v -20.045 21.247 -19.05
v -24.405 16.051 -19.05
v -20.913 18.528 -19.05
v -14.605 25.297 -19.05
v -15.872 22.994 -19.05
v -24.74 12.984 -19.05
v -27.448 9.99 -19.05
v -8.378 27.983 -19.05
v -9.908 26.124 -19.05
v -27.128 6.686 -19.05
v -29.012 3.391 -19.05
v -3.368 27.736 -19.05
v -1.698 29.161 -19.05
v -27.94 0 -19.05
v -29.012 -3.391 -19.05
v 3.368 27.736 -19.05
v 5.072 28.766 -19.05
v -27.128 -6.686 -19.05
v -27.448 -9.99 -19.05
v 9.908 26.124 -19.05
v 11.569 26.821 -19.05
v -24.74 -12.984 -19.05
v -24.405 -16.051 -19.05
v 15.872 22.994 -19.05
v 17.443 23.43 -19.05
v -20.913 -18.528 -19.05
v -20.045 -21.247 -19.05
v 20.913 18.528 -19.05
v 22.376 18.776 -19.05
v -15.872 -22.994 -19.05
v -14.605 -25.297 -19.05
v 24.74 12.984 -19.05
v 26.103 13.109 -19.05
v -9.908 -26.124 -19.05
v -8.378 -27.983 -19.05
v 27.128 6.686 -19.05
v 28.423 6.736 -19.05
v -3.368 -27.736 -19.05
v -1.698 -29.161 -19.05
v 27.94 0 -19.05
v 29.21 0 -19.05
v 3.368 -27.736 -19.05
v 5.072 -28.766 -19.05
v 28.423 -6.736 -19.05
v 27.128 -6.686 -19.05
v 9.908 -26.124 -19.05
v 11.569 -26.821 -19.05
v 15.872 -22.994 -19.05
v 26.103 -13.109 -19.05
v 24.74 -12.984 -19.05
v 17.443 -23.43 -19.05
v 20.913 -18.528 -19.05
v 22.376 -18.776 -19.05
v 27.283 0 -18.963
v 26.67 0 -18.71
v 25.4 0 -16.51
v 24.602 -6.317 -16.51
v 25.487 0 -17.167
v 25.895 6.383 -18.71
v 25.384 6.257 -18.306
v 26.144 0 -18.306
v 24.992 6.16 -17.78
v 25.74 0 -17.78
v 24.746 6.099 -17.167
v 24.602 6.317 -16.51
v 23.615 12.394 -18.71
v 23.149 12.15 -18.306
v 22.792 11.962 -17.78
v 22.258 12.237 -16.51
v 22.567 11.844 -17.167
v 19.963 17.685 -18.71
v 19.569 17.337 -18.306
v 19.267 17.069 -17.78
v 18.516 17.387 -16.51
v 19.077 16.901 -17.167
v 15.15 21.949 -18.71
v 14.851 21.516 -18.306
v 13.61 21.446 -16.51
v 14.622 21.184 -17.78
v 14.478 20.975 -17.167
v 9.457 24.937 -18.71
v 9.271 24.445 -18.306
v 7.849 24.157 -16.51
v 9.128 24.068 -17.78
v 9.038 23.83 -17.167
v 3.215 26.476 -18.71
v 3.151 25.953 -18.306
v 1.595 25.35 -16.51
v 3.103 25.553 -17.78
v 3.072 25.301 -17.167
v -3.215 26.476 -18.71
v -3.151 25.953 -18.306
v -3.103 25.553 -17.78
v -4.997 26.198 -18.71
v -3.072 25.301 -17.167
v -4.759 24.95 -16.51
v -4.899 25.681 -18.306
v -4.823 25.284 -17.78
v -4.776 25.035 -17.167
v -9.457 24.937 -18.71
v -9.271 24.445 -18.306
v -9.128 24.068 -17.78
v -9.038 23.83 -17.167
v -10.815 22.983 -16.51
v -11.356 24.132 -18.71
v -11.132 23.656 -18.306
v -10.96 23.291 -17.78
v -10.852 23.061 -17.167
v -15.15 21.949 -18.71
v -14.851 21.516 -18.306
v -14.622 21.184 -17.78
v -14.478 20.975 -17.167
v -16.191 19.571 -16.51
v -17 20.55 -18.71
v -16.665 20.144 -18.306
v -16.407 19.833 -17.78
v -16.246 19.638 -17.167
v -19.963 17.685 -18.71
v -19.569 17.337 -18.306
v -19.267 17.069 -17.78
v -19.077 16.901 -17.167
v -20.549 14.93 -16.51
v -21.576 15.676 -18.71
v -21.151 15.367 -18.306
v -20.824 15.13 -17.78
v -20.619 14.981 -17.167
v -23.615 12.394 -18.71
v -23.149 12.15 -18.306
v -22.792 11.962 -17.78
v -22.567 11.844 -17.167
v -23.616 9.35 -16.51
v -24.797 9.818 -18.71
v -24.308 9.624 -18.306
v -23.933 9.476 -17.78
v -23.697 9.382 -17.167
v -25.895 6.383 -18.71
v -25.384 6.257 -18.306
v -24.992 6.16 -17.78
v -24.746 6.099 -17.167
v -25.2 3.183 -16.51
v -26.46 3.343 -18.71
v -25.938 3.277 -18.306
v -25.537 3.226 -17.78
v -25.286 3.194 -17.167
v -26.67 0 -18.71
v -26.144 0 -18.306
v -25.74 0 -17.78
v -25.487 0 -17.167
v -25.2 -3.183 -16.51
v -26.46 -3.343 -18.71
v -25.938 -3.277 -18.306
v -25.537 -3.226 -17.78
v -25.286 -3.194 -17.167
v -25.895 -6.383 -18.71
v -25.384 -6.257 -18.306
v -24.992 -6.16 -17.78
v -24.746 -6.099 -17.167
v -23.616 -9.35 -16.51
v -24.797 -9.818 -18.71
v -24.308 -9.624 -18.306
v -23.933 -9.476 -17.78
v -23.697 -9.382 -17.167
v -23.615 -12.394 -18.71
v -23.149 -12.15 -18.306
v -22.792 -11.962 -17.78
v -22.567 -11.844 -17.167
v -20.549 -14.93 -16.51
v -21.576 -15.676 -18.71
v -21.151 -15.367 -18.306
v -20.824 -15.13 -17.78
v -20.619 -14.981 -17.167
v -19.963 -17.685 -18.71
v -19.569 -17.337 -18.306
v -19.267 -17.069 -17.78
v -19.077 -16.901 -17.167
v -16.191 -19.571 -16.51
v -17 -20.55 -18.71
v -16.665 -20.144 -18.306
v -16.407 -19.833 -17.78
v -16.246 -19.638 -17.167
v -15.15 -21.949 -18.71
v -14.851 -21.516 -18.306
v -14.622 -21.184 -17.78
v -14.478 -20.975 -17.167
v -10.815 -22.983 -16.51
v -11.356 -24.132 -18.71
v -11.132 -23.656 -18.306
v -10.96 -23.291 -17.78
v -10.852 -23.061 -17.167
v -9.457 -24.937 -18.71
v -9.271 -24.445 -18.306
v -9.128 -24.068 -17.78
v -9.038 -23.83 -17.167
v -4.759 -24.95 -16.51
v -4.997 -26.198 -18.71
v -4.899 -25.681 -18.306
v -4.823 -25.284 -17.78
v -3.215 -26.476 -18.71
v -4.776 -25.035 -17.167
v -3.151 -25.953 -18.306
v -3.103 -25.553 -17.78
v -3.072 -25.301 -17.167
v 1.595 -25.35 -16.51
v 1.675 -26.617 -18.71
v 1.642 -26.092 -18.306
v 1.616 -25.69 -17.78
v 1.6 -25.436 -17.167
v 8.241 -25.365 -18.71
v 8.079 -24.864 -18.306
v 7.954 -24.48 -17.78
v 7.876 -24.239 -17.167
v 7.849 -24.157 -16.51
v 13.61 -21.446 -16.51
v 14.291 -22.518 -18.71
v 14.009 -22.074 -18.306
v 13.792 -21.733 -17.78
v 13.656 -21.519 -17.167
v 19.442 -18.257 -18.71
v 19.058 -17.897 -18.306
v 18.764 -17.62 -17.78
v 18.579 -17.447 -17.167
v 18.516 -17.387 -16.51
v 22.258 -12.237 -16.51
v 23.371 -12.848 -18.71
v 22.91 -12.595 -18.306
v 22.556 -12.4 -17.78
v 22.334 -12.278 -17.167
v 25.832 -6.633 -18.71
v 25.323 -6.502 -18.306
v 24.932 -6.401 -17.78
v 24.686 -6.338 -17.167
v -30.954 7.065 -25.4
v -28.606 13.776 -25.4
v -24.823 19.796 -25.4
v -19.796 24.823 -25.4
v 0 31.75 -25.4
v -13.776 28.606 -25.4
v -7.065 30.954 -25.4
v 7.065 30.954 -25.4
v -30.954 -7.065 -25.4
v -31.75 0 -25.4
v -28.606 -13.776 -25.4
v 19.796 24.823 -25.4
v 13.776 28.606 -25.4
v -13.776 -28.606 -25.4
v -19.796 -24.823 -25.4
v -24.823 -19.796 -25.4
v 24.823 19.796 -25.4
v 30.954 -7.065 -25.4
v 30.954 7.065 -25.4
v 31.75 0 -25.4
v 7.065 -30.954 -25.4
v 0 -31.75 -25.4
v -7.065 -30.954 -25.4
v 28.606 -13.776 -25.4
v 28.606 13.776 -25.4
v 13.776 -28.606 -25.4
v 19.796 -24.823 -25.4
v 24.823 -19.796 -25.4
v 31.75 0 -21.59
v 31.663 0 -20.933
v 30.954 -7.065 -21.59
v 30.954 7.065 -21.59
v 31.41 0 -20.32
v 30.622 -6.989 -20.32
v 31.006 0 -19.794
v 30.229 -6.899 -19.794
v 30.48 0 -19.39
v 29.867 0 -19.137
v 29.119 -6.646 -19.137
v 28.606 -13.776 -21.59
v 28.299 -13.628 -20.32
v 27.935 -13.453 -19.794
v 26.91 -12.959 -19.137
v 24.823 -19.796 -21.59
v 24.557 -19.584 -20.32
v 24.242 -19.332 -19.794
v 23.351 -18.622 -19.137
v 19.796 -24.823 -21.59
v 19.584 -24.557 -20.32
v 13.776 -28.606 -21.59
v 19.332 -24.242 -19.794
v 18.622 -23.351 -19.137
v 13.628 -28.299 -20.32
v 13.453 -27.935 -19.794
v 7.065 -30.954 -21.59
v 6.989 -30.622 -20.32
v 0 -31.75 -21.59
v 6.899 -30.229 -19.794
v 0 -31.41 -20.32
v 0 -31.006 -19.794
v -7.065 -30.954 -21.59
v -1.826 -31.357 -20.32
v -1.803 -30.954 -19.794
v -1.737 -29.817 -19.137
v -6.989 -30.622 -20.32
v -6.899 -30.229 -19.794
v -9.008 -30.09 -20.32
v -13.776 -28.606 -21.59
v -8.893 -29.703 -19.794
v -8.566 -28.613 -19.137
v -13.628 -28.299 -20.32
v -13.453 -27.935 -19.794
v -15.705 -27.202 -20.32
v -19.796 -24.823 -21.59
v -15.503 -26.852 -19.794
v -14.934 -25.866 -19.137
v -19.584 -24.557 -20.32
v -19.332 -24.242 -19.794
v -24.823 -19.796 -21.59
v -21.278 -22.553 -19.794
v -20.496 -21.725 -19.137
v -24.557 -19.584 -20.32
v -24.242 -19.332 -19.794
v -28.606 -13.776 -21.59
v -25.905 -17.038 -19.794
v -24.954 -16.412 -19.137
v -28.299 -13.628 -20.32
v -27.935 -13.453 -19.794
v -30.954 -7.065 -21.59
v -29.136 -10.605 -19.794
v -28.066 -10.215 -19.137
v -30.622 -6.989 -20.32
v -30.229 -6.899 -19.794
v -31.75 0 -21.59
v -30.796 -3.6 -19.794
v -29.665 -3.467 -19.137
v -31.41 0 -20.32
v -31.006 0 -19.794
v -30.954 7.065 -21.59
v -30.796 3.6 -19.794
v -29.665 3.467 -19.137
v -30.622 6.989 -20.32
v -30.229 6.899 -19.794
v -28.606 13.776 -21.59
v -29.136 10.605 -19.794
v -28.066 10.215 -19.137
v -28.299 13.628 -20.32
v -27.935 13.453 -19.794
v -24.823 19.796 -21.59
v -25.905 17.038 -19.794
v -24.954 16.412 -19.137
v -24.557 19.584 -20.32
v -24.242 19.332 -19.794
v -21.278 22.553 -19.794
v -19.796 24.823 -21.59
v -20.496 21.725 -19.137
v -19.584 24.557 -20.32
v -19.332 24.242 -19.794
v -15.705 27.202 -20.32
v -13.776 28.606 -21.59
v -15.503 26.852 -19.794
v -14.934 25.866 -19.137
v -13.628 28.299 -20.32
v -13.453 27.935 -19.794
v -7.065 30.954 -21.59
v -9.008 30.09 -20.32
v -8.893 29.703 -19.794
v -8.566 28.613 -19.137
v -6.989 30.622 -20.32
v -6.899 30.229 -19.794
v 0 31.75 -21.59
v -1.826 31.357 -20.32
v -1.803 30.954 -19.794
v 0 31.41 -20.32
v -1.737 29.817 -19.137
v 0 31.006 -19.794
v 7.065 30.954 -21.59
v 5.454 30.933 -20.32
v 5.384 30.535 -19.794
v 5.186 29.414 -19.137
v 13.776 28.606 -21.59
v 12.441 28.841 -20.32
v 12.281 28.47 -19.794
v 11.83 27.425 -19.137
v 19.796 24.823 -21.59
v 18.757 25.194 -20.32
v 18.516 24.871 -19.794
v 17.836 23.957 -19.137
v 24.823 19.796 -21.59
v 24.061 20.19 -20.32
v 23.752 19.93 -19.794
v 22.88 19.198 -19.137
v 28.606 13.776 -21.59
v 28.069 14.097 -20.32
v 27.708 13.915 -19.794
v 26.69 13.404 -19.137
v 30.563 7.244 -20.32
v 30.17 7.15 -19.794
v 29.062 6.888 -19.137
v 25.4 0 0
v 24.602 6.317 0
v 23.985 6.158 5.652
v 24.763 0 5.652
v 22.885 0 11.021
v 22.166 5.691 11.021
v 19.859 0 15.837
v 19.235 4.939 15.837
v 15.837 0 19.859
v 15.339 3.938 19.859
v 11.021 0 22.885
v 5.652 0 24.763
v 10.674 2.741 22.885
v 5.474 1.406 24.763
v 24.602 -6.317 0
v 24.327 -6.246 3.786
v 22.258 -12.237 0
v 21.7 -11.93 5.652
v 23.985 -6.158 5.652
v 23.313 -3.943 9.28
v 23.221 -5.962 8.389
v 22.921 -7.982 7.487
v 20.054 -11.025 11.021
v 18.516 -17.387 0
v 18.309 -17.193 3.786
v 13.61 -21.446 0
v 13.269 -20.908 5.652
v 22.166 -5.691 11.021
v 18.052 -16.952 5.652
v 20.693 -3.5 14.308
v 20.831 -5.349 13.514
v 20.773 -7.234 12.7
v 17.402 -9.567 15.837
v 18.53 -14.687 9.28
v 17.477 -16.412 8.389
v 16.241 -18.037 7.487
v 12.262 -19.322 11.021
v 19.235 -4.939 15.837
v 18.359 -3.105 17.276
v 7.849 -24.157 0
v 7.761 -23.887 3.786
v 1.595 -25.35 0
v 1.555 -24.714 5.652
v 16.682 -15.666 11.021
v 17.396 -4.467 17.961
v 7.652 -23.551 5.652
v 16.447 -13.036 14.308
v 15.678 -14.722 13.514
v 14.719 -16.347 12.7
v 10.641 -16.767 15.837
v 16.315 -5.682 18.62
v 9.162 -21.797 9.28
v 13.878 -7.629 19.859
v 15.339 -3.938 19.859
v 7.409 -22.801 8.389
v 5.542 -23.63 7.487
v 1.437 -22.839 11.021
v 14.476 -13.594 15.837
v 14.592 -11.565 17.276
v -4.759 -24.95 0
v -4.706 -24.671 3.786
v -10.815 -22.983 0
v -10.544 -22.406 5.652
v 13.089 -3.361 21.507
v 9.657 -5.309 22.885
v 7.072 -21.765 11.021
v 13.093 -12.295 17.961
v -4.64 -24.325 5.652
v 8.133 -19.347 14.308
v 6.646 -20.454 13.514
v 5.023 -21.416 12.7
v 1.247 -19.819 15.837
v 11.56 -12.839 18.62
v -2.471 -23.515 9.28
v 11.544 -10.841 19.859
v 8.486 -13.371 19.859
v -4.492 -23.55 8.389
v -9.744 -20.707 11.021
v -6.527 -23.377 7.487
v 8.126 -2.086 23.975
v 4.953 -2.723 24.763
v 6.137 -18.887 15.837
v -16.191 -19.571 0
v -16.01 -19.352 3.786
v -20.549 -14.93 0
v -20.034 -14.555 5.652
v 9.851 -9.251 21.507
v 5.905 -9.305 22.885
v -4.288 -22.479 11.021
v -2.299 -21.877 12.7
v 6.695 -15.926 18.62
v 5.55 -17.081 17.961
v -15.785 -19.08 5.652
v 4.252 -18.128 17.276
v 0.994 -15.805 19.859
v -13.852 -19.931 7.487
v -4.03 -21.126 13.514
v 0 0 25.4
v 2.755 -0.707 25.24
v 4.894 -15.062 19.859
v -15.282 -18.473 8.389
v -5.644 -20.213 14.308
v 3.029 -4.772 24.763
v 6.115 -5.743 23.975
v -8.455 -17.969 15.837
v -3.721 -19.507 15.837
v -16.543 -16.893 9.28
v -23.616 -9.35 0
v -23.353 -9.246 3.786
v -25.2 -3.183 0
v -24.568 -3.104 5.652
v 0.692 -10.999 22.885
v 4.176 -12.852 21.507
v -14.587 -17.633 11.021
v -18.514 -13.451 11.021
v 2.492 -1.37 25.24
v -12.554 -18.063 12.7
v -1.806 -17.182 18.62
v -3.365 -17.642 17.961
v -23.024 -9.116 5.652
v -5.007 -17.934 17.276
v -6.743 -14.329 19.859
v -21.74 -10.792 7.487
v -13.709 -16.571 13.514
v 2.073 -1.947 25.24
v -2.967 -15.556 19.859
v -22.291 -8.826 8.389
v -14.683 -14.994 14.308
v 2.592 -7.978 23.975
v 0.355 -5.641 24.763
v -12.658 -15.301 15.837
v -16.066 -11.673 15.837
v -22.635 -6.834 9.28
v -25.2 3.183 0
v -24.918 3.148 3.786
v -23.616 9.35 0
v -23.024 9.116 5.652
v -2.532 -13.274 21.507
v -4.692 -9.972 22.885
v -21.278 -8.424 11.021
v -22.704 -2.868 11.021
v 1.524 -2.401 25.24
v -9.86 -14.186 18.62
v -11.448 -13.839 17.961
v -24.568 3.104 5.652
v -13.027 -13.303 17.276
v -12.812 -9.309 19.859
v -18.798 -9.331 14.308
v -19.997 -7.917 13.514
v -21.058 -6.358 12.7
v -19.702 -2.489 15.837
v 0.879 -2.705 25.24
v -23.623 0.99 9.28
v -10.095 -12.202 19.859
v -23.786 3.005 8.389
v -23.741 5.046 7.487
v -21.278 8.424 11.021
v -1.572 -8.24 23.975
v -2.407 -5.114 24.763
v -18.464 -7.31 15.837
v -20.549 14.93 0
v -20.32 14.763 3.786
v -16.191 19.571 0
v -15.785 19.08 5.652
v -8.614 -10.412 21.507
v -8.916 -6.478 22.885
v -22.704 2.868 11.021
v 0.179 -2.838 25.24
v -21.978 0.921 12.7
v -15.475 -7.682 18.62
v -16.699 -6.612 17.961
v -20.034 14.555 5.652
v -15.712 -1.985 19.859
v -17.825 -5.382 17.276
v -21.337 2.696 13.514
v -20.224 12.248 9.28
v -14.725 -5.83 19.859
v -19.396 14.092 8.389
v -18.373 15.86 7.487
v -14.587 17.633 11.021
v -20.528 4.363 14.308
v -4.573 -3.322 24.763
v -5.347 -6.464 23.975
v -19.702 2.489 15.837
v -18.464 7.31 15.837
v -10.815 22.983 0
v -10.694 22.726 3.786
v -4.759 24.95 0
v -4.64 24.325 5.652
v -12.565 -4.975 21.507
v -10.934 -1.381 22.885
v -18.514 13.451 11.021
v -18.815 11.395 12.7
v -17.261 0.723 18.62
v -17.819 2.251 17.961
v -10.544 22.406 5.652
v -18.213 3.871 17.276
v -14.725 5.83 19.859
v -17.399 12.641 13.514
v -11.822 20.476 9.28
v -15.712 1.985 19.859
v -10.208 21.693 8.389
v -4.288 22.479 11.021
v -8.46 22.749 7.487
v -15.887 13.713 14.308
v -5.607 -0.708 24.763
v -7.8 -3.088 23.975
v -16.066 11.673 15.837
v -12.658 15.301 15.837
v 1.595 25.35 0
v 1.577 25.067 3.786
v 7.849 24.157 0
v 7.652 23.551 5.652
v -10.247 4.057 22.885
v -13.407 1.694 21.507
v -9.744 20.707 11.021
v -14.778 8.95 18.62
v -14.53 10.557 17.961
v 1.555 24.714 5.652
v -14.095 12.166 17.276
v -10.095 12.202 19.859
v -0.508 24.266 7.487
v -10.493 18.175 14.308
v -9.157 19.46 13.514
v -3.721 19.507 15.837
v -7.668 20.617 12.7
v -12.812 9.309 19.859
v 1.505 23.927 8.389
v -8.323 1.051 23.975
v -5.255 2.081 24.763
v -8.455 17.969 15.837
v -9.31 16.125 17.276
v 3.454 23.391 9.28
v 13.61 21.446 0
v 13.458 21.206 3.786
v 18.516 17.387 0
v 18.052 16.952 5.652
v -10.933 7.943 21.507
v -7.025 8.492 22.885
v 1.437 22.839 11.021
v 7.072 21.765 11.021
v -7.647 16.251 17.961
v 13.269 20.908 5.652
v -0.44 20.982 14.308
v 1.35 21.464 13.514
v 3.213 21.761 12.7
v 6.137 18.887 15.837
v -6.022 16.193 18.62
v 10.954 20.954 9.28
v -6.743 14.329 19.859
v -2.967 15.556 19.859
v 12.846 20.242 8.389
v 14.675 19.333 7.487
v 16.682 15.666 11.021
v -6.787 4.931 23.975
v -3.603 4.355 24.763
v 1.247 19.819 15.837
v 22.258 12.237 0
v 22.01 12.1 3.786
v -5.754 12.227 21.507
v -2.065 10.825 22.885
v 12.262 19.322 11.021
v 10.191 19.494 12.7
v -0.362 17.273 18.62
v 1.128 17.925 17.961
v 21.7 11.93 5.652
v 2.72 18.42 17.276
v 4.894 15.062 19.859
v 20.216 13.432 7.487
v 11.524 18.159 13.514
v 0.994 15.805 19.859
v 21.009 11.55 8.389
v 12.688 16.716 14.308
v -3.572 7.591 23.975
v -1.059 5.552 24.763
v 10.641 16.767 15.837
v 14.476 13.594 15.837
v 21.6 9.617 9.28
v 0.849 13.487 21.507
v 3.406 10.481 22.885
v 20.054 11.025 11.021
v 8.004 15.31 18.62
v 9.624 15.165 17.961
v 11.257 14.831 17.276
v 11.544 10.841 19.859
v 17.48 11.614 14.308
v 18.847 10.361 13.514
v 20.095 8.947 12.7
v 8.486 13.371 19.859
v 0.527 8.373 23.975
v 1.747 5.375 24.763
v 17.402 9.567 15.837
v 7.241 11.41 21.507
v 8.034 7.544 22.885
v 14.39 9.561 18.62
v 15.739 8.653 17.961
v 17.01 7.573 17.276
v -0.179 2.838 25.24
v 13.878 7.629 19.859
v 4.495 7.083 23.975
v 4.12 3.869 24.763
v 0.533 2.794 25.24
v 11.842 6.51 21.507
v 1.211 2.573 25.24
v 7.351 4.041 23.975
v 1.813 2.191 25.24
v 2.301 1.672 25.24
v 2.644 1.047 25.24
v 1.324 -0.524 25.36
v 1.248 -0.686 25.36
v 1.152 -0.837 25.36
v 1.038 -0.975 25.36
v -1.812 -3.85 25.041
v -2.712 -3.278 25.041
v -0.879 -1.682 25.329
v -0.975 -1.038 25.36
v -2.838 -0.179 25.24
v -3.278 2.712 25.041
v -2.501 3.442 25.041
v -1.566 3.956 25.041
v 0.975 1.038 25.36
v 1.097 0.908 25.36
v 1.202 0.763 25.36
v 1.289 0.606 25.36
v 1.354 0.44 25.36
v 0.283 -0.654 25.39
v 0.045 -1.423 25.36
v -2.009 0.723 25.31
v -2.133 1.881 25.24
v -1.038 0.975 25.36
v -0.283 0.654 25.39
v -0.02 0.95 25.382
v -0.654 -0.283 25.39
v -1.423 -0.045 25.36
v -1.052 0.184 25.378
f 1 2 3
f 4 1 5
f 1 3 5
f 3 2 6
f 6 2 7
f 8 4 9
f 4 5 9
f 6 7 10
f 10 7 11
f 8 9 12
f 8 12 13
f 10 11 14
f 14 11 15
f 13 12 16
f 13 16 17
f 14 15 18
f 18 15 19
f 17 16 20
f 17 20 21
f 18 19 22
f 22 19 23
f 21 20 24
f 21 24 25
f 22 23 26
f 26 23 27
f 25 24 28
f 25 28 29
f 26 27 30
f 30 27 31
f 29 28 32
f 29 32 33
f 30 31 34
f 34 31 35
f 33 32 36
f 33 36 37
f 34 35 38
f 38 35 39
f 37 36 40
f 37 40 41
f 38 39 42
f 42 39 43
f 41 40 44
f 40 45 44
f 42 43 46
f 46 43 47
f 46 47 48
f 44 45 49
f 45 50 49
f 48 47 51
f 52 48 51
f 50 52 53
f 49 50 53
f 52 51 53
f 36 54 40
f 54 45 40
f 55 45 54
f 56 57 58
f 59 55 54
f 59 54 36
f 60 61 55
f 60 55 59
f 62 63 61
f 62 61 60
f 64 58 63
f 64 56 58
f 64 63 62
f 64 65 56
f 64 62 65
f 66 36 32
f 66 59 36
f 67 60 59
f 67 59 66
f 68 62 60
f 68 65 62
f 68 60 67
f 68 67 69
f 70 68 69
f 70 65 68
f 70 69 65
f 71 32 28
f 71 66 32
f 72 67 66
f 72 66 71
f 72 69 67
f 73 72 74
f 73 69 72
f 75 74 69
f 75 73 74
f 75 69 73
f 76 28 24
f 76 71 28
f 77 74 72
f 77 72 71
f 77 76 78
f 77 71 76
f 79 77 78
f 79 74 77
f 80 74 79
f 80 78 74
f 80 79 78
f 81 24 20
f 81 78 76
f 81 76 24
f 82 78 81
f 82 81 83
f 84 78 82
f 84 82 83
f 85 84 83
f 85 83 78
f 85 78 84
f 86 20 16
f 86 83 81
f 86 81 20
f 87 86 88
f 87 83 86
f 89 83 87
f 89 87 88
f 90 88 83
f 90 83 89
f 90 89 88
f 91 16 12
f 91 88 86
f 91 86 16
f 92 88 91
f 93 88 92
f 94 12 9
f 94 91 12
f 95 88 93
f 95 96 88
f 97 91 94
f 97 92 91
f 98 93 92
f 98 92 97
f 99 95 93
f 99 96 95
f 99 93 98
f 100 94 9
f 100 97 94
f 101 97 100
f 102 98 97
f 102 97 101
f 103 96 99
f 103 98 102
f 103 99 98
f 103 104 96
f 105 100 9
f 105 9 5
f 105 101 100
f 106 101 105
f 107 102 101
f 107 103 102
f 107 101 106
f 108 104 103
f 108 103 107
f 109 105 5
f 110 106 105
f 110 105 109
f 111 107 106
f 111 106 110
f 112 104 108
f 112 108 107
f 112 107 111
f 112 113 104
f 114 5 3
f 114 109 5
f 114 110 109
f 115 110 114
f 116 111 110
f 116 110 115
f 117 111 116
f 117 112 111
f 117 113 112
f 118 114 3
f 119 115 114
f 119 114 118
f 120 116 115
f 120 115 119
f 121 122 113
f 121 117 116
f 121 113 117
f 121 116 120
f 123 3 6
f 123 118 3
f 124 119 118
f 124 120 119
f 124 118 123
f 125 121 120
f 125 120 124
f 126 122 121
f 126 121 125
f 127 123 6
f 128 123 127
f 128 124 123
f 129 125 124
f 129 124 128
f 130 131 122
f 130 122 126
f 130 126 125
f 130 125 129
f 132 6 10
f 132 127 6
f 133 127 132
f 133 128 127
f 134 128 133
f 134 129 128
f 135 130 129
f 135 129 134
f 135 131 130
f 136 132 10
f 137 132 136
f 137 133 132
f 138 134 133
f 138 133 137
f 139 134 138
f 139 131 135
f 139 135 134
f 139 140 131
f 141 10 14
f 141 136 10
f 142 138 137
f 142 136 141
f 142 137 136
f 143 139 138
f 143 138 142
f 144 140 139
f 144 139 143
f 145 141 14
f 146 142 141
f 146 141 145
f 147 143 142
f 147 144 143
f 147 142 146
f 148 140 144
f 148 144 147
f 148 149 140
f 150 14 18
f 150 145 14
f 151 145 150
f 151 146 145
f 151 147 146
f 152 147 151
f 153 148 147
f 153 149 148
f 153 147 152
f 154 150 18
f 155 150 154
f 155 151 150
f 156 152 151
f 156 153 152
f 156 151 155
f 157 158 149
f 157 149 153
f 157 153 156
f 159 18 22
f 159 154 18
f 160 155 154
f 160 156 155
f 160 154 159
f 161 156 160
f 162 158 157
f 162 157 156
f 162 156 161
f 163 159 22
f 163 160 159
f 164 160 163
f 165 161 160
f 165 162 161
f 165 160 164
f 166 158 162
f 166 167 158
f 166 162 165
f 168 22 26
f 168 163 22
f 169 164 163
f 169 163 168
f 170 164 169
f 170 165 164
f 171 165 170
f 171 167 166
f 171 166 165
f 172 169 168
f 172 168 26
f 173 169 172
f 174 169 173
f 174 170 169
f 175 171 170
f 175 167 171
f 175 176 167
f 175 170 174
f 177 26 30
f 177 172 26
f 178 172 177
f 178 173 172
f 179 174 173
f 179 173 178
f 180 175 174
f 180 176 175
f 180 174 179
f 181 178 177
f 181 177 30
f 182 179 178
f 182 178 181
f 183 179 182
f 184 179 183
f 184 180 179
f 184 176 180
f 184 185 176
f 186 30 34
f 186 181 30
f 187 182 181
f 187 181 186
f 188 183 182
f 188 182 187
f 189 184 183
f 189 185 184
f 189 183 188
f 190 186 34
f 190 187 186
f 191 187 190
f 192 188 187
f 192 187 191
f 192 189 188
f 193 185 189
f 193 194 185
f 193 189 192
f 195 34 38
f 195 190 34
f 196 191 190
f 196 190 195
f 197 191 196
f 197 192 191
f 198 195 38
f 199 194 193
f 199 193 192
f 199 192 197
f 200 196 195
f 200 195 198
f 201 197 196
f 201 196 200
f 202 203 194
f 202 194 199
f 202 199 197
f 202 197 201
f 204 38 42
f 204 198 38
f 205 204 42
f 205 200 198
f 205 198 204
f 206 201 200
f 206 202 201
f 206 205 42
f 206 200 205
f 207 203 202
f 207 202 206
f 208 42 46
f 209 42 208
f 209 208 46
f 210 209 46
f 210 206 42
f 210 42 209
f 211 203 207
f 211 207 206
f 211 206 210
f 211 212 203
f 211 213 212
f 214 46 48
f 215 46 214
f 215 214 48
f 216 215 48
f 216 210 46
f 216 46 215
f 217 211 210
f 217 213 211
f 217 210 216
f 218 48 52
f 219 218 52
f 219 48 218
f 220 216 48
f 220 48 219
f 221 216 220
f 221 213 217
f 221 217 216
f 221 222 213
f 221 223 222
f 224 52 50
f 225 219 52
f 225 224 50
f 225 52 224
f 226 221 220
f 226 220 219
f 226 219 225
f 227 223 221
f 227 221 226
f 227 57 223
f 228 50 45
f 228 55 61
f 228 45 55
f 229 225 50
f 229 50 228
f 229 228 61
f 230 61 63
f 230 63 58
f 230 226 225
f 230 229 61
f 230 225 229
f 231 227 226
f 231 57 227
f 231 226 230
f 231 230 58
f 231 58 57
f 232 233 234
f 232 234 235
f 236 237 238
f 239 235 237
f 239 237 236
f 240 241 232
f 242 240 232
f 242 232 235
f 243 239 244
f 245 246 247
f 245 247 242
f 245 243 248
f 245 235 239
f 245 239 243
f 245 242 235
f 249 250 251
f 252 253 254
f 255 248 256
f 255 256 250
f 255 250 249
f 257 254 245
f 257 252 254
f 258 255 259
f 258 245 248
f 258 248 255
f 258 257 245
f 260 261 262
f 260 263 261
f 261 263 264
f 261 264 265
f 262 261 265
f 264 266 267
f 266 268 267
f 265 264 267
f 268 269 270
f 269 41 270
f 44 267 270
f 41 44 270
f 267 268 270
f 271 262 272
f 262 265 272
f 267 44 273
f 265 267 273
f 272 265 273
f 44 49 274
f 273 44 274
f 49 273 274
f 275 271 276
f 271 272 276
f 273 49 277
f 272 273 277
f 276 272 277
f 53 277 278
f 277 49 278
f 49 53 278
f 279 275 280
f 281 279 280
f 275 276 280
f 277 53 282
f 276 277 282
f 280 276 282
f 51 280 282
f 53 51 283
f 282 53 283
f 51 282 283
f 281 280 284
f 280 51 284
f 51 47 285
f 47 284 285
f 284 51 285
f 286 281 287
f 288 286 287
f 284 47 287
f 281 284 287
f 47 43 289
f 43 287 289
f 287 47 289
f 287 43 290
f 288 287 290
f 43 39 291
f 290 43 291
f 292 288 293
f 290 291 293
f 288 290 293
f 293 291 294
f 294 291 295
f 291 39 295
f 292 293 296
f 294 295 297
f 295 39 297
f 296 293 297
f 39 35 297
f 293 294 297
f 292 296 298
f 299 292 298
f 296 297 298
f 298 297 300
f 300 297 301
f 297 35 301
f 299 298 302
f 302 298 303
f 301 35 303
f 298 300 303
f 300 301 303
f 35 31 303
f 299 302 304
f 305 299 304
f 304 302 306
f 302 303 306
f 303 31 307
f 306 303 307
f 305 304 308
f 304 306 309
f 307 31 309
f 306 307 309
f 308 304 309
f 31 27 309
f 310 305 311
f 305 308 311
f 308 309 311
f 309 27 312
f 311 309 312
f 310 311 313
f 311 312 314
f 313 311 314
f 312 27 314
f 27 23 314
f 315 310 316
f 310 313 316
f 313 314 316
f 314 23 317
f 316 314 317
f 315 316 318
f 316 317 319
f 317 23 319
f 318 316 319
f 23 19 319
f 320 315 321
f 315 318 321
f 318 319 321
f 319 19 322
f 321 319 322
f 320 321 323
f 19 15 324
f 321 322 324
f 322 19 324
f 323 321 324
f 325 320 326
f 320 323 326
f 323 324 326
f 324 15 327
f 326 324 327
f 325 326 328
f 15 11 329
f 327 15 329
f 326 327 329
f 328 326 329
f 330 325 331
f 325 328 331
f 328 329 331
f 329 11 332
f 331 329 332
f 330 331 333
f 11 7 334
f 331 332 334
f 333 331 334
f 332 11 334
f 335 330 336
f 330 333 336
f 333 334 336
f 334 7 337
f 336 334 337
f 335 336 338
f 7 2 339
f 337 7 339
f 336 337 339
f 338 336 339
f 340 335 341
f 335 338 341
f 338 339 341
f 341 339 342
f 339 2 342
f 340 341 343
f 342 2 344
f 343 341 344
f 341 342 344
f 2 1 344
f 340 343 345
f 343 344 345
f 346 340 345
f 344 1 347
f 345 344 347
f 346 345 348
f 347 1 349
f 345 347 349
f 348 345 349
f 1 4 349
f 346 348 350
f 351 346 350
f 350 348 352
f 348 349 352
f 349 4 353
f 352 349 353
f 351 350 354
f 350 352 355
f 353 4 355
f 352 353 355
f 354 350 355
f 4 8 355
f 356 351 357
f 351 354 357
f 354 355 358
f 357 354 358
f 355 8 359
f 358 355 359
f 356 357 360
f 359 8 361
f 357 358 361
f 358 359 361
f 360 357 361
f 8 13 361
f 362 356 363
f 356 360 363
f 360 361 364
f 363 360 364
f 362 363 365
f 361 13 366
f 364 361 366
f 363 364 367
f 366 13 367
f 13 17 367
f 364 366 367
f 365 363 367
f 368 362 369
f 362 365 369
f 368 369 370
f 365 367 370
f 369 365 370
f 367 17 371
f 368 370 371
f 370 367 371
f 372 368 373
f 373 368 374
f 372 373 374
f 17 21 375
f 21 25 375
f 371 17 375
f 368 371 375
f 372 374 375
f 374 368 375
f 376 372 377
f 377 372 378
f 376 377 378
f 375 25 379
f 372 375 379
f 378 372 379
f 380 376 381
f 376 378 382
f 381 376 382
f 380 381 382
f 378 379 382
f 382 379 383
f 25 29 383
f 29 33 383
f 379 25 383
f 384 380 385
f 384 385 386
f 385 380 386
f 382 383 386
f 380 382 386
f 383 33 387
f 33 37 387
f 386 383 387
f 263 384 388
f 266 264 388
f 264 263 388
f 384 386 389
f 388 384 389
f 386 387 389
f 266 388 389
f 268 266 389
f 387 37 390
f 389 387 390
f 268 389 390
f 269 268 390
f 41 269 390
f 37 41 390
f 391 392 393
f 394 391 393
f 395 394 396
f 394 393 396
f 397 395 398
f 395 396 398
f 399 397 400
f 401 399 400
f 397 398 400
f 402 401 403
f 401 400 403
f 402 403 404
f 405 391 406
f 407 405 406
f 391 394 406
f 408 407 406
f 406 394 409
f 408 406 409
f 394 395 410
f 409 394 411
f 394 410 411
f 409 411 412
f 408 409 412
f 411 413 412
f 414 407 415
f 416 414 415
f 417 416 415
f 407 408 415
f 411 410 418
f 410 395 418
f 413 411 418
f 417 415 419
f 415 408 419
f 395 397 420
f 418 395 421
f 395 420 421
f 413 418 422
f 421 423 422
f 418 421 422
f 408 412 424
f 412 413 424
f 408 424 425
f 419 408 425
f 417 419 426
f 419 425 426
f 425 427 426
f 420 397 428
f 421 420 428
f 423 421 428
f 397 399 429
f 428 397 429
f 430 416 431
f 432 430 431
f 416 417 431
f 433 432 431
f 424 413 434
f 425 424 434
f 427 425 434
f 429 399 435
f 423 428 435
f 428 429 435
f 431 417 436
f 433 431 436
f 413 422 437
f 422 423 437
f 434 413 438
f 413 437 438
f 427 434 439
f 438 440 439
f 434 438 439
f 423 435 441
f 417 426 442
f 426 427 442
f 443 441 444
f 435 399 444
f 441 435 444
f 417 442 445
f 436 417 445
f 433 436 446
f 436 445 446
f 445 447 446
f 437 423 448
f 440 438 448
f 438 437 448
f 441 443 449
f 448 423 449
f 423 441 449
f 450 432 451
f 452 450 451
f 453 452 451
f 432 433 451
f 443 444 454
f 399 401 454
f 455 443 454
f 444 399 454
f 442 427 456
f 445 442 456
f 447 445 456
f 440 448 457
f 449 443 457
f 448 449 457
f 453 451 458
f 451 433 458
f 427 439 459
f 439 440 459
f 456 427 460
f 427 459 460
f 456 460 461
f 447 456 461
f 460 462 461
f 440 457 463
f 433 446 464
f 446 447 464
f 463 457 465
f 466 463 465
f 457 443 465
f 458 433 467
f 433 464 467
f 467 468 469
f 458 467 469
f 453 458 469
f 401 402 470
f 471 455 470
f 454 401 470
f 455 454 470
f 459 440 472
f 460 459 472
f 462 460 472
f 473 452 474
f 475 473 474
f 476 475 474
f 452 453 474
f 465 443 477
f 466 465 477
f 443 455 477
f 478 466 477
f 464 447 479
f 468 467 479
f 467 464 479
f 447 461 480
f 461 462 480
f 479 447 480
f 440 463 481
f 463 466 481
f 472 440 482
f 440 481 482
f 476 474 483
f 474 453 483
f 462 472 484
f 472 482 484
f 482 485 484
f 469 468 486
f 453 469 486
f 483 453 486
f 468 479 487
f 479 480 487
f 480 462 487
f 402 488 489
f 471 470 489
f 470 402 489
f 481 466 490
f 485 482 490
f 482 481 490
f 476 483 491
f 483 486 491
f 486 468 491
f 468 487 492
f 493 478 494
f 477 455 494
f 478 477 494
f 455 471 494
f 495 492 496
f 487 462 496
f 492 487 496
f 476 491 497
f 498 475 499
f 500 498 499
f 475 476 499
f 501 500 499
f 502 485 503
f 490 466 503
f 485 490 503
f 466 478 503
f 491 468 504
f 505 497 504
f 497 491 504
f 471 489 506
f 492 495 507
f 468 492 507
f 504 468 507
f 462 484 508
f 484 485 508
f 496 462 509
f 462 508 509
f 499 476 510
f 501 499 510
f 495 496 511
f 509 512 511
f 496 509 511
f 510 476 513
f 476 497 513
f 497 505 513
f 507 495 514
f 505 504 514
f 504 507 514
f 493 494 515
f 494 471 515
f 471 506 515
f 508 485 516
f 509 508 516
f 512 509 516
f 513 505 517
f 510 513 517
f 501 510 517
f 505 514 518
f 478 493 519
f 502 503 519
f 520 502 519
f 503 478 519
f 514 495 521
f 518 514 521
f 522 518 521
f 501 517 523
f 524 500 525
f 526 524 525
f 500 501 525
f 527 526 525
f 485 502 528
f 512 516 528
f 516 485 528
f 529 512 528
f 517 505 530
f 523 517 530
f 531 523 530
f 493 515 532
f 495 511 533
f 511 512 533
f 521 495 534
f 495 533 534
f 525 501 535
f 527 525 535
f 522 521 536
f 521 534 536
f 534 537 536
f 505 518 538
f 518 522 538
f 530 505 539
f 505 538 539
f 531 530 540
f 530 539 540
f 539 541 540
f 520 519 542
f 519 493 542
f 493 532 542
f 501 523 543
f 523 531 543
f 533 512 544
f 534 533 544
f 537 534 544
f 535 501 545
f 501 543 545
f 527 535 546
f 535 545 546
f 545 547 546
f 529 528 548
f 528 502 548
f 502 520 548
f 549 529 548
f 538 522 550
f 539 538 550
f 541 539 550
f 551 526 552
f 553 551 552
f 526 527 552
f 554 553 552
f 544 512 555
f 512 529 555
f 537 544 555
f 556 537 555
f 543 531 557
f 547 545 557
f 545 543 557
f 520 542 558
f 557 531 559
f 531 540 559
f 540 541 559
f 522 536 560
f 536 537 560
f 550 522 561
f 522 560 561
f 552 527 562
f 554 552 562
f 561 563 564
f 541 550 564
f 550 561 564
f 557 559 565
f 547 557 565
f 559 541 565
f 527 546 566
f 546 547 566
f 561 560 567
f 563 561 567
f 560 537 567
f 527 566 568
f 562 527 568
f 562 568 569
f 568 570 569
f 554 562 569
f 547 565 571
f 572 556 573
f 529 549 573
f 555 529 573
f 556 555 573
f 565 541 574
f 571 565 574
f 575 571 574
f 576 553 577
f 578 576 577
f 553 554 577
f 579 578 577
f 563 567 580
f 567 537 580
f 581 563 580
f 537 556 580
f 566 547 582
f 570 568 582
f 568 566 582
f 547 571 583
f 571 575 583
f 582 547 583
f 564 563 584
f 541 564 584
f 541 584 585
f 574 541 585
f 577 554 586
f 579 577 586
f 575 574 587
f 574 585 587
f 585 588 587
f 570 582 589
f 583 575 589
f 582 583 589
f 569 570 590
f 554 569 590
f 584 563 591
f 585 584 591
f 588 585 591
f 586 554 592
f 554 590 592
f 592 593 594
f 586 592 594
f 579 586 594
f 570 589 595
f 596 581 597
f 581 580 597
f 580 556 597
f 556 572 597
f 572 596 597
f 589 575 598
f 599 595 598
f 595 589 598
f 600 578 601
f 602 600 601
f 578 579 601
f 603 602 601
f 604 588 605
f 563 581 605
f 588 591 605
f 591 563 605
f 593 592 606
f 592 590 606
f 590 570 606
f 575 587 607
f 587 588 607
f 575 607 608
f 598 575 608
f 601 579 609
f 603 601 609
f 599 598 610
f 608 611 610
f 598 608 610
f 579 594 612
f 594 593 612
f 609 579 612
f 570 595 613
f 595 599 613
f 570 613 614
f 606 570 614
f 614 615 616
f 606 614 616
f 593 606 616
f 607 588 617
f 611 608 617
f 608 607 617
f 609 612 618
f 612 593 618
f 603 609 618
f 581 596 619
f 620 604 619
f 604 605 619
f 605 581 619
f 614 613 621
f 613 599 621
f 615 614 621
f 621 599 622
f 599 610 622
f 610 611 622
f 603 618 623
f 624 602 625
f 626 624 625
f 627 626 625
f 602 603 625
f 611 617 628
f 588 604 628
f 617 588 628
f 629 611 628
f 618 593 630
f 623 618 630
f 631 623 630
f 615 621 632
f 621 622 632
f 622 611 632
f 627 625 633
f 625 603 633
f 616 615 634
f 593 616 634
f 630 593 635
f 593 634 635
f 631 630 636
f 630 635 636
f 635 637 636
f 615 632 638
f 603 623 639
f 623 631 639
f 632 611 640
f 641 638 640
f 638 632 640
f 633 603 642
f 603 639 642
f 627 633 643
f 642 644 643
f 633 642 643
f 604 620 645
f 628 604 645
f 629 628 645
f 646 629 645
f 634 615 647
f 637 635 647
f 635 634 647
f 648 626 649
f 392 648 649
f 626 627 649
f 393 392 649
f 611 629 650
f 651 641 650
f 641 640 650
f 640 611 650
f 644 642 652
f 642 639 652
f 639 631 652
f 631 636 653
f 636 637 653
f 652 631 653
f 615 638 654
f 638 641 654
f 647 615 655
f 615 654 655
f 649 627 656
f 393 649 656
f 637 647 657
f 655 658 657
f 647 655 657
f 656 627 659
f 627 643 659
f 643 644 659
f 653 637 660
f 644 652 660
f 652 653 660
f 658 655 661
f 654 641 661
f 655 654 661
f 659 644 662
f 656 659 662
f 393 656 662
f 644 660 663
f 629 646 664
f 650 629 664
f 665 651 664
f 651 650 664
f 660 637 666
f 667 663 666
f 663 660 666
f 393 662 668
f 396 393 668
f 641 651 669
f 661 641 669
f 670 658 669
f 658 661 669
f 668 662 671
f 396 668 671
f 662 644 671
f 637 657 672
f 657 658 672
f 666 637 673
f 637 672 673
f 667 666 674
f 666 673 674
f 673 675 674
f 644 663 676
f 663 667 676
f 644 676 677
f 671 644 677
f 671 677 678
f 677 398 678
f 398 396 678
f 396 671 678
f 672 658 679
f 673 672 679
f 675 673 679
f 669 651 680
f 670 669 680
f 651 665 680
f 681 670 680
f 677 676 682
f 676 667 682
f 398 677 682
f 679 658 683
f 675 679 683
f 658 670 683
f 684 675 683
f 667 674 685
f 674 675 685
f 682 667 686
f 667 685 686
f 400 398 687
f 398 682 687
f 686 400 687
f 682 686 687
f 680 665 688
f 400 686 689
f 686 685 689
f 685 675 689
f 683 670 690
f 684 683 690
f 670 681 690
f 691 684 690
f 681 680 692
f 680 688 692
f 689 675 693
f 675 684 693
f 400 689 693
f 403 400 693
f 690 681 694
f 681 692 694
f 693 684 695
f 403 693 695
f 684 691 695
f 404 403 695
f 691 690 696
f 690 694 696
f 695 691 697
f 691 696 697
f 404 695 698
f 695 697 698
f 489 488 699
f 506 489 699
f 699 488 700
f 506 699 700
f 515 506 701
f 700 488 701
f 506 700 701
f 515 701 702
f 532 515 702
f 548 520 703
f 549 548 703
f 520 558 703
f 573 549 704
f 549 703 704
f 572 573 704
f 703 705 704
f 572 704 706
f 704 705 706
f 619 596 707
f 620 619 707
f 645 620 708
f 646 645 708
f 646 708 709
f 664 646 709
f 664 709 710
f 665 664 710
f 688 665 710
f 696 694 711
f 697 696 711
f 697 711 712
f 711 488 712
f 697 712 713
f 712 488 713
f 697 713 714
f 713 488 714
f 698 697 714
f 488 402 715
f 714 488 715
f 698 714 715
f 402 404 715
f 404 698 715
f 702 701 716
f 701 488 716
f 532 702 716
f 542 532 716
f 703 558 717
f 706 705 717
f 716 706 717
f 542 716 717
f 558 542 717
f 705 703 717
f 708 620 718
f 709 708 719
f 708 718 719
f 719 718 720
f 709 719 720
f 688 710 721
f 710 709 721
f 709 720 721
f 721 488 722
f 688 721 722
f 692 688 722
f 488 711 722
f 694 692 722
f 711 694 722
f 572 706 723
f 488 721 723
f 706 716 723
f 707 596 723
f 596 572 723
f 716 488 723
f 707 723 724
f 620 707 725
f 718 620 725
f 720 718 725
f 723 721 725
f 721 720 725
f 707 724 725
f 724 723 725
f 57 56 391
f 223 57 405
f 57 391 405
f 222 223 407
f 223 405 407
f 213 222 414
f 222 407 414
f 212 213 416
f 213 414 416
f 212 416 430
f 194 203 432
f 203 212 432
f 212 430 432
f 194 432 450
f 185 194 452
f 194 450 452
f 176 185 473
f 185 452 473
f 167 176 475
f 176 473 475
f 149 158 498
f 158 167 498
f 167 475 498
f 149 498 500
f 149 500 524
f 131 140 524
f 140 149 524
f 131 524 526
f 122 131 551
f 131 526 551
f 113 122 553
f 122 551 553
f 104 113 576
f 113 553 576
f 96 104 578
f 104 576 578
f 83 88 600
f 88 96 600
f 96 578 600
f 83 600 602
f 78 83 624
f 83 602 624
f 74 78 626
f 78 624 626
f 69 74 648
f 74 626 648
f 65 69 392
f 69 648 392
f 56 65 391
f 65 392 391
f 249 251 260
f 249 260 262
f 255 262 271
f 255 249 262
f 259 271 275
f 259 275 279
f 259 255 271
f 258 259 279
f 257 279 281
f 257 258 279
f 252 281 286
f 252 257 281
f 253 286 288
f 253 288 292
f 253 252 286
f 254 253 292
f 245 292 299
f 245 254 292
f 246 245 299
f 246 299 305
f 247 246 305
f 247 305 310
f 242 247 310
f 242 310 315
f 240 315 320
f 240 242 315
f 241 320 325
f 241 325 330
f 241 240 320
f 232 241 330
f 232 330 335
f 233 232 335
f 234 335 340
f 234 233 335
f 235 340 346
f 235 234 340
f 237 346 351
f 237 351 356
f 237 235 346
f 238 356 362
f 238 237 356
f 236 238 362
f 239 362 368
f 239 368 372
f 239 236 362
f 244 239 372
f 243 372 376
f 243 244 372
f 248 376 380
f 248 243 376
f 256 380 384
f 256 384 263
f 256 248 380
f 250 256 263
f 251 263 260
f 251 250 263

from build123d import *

# Parameters (mm, degrees)
F2_R     = 31.75
F3_DEPTH = 6.35
F4_R     = 2.54


with BuildPart() as f1:
    # F0 (on Front) → F1 (revolve)
    with BuildSketch(Plane.XZ):
        with BuildLine():
            ThreePointArc((25.4, 0), (17.960512, 17.960512), (0, 25.4))
            Line((0, 25.4), (0, -25.4))
            Line((0, -25.4), (25.4, -25.4))
            Line((25.4, -25.4), (25.4, 0))
        make_face()
    revolve(axis=Axis((0, 0, 0), (0, 0, -1)))

    # F2 (on face) → F3 (join)
    with BuildSketch(Plane(origin=(0, 0, -25.4), x_dir=(1, 0, 0), z_dir=(0, 0, -1))):
        Circle(F2_R)
    extrude(amount=-F3_DEPTH)

    # F4
    f4_edges = [f1.edges().sort_by_distance(p)[0] for p in [
        (-25.4, 0, -19.05),
        (-31.75, 0, -19.05),
        (-25.4, 0, 0),
    ]]
    fillet(f4_edges, radius=F4_R)


solid = f1.part
